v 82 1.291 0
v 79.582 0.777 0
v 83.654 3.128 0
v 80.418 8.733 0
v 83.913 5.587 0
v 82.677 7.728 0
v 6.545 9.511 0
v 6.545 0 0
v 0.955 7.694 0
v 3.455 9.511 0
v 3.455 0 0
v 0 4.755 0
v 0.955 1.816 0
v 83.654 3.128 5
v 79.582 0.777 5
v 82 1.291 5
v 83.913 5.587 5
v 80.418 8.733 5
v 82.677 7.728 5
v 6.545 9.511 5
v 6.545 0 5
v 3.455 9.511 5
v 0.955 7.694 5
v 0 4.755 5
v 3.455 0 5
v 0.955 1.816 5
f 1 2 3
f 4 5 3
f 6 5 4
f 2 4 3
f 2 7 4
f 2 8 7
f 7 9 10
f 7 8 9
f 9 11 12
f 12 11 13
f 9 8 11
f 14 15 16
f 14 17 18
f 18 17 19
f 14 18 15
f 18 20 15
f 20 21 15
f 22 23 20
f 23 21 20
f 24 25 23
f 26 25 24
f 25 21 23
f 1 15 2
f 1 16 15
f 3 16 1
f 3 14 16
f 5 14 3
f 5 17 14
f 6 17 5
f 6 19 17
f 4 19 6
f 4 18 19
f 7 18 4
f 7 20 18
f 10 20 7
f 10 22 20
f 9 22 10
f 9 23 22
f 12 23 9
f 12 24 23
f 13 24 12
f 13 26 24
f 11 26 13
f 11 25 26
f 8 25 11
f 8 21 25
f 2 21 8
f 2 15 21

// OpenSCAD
$fn = 32;

// ----------------------------------------------------------------------
// Lever arm: two bosses 10 and 8 mm, 75 mm between centres
// ----------------------------------------------------------------------

// --- parameters (mm) ---
profile_height = 5;       // extrusion height
profile_points = 13;      // points of the closed outline

profile = [[0, 4.755], [0.955, 1.816], [3.455, 0], [6.545, 0], [79.582, 0.777], [82, 1.291], [83.654, 3.128], [83.913, 5.587], [82.677, 7.728], [80.418, 8.733], [6.545, 9.511], [3.455, 9.511], [0.955, 7.694]];  // single closed polygon, 13 points, counter clockwise

// --- the one profile operation ---
linear_extrude(height = profile_height) polygon(points = profile);
